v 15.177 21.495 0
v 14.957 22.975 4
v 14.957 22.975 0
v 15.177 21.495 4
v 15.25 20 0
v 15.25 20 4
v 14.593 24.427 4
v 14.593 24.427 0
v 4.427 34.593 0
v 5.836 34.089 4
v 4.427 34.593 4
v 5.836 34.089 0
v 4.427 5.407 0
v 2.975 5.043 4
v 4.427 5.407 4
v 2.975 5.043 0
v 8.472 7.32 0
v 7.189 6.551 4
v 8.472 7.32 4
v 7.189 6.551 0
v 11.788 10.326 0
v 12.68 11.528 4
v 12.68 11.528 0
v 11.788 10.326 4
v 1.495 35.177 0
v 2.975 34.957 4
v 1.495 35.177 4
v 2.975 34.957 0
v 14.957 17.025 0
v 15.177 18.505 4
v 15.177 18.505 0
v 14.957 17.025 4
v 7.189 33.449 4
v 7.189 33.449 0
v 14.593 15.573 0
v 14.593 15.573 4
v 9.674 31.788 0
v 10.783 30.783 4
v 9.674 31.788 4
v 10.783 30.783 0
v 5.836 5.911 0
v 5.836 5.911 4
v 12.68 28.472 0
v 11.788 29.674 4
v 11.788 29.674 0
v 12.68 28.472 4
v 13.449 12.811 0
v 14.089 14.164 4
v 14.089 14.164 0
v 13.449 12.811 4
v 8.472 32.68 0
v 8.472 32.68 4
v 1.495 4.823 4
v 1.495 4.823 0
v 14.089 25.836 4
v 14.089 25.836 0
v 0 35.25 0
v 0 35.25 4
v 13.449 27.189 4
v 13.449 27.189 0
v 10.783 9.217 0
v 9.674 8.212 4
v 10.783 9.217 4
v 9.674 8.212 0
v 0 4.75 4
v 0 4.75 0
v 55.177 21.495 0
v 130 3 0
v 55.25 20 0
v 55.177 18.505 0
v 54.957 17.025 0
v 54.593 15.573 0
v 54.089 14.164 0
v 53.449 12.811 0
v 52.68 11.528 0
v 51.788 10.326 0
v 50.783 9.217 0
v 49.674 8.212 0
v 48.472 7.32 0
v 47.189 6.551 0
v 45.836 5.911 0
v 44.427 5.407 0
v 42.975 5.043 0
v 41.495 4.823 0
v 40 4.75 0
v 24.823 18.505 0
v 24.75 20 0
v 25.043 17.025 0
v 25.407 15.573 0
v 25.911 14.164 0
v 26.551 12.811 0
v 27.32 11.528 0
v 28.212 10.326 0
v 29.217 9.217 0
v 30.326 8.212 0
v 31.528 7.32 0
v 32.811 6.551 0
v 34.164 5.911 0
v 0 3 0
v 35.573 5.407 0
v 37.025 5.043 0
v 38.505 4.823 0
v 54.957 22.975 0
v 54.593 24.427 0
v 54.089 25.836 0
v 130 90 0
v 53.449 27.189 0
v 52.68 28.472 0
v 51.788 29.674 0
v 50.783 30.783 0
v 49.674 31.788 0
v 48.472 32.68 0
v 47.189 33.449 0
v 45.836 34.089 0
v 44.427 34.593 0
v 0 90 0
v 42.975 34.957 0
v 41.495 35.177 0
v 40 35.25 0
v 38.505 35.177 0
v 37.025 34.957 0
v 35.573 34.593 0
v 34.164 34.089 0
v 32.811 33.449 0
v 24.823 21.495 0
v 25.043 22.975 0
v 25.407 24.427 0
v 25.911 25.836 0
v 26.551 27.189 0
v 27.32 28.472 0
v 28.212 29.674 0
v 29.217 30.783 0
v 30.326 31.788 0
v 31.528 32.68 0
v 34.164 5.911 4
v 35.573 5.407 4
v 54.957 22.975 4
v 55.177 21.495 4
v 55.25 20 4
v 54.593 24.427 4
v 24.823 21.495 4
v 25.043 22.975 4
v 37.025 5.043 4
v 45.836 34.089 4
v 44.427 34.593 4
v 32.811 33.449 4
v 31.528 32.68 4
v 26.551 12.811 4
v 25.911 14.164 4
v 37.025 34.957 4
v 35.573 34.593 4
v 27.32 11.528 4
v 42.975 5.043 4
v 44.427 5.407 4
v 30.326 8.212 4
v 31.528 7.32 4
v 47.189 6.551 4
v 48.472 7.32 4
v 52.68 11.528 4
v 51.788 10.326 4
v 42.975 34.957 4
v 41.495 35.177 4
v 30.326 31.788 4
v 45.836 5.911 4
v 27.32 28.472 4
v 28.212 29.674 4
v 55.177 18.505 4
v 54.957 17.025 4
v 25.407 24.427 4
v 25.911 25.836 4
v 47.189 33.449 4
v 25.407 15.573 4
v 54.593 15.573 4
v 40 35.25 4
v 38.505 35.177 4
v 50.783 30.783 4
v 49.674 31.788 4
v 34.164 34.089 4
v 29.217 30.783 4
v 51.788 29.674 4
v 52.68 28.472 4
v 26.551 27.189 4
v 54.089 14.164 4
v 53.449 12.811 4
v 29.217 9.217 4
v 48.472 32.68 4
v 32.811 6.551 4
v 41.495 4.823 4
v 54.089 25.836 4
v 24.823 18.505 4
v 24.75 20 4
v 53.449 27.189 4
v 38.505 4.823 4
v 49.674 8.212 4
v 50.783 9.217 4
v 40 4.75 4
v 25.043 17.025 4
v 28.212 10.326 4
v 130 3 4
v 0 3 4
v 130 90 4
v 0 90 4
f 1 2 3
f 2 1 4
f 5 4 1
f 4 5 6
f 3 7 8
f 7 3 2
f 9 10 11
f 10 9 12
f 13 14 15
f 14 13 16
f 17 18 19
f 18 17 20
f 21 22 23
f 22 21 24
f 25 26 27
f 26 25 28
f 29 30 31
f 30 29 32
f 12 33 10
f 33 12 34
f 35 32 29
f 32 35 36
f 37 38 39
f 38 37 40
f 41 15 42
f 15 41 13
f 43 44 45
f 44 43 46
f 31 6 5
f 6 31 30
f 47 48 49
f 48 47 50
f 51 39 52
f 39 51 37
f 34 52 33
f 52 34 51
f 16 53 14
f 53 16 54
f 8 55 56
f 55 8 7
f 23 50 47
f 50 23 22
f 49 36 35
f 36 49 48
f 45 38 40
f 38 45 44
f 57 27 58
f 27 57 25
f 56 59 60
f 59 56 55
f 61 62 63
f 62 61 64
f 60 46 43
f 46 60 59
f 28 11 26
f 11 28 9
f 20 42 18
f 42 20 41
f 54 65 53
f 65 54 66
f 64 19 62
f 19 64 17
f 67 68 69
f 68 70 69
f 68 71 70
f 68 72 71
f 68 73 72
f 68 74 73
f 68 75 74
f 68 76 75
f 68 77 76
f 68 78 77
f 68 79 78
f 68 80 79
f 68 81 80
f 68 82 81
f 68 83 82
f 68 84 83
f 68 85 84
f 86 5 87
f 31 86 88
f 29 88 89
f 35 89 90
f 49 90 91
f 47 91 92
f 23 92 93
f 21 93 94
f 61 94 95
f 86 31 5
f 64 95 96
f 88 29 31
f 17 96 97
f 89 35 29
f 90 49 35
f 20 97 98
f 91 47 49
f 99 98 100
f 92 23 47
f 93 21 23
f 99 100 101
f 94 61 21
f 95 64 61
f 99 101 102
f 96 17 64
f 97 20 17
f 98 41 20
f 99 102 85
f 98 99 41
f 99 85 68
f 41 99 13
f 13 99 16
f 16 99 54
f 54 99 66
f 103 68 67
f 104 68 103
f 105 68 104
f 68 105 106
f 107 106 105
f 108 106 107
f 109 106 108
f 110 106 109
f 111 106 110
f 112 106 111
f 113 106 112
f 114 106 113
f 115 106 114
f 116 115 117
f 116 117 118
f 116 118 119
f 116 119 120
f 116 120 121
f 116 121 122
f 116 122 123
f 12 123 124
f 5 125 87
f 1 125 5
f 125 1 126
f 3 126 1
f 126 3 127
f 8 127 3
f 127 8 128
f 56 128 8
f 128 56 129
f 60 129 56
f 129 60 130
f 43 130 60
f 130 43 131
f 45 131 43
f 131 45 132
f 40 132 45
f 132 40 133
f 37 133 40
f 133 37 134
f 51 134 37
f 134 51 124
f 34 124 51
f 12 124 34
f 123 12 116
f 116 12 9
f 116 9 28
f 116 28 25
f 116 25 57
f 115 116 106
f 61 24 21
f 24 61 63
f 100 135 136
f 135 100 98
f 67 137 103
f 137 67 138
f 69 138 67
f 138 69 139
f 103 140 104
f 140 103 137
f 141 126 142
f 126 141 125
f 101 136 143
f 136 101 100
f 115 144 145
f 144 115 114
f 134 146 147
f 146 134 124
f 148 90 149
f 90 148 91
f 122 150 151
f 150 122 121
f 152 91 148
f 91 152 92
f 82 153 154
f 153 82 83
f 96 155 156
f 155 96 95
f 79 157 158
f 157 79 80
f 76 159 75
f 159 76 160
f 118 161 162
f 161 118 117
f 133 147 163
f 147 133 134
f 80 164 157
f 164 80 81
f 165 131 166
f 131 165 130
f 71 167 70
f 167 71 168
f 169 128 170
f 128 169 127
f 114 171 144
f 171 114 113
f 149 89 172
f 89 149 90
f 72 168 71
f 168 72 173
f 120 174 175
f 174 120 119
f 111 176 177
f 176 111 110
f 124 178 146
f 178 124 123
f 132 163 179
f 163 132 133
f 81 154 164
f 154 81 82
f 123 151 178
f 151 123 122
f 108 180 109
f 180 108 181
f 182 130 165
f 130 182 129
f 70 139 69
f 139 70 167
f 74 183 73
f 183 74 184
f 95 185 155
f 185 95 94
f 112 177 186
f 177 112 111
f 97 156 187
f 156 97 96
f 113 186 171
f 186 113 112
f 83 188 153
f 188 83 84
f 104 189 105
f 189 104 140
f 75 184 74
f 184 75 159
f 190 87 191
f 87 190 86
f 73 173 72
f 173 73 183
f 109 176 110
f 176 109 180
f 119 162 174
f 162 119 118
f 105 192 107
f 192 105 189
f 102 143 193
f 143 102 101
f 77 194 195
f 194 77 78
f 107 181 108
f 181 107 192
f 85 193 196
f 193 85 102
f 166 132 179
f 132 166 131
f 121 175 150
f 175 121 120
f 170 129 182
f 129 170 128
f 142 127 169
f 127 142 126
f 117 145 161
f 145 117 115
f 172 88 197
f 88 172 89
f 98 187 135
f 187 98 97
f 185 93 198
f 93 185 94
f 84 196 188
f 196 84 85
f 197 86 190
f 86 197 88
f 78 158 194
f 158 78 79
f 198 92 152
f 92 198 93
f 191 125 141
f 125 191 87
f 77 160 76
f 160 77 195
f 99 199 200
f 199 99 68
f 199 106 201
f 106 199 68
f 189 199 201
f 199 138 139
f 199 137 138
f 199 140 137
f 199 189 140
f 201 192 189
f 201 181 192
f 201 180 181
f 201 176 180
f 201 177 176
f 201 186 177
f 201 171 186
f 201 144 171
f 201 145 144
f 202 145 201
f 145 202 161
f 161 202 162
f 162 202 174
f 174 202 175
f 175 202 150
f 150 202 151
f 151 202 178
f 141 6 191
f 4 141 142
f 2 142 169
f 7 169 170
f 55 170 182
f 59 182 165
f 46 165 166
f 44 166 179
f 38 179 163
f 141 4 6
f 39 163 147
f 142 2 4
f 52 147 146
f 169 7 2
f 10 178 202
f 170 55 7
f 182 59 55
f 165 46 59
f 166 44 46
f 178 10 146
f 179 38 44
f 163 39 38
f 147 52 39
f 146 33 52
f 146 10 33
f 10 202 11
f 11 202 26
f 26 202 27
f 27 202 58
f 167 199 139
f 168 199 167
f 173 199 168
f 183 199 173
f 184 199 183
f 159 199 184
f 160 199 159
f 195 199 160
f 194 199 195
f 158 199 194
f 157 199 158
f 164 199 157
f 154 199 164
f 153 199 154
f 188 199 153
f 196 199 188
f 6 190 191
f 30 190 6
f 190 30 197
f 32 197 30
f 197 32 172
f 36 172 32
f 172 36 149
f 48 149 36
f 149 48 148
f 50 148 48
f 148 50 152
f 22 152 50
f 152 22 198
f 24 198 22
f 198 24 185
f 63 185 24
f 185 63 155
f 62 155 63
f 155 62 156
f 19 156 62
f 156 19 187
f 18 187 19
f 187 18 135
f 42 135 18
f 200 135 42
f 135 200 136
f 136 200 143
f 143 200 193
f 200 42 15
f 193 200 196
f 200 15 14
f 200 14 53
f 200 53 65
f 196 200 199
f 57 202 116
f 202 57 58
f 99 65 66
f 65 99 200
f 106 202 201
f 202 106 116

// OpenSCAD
// Tube rack - a flat plate with a regular grid of tube holes and two solid wall guides along the
// long edges. NOVEL general part (a generic hole grid, not any one labware item). Teaches a regular
// (grid) hole pattern, a wall built up from a base plate, and a part that is intentionally
// upside-down for the print: it rests on the bed then is flipped over so the walls stand on the
// surface it was printed against.
//

cols   = 3;
rows   = 2;
tube_d = 30.5;
pitch  = 40;
plate_l = 130;
plate_w = 90;
base_t = 4;
wall_h = 70;

$fn = 64;

col_pitch = pitch;
row_pitch = pitch;

difference() {
    cube([plate_l, plate_w, base_t]);
    for (x = [-(cols - 1) * col_pitch / 2 : col_pitch : (cols - 1) * col_pitch / 2],
        y = [-(rows - 1) * row_pitch / 2 : row_pitch : (rows - 1) * row_pitch / 2]) {
        translate([x, y, 0]) cylinder(h = base_t + 1, d = tube_d);     // through-holes
    }
    // two solid walls along the long edges (X = +/- L/2), e.g. for the tubes to lean against
    for (x = [-plate_l / 2, plate_l / 2]) {
        translate([x, -1, 0]) cube([plate_l, 4, wall_h]);
    }
}
